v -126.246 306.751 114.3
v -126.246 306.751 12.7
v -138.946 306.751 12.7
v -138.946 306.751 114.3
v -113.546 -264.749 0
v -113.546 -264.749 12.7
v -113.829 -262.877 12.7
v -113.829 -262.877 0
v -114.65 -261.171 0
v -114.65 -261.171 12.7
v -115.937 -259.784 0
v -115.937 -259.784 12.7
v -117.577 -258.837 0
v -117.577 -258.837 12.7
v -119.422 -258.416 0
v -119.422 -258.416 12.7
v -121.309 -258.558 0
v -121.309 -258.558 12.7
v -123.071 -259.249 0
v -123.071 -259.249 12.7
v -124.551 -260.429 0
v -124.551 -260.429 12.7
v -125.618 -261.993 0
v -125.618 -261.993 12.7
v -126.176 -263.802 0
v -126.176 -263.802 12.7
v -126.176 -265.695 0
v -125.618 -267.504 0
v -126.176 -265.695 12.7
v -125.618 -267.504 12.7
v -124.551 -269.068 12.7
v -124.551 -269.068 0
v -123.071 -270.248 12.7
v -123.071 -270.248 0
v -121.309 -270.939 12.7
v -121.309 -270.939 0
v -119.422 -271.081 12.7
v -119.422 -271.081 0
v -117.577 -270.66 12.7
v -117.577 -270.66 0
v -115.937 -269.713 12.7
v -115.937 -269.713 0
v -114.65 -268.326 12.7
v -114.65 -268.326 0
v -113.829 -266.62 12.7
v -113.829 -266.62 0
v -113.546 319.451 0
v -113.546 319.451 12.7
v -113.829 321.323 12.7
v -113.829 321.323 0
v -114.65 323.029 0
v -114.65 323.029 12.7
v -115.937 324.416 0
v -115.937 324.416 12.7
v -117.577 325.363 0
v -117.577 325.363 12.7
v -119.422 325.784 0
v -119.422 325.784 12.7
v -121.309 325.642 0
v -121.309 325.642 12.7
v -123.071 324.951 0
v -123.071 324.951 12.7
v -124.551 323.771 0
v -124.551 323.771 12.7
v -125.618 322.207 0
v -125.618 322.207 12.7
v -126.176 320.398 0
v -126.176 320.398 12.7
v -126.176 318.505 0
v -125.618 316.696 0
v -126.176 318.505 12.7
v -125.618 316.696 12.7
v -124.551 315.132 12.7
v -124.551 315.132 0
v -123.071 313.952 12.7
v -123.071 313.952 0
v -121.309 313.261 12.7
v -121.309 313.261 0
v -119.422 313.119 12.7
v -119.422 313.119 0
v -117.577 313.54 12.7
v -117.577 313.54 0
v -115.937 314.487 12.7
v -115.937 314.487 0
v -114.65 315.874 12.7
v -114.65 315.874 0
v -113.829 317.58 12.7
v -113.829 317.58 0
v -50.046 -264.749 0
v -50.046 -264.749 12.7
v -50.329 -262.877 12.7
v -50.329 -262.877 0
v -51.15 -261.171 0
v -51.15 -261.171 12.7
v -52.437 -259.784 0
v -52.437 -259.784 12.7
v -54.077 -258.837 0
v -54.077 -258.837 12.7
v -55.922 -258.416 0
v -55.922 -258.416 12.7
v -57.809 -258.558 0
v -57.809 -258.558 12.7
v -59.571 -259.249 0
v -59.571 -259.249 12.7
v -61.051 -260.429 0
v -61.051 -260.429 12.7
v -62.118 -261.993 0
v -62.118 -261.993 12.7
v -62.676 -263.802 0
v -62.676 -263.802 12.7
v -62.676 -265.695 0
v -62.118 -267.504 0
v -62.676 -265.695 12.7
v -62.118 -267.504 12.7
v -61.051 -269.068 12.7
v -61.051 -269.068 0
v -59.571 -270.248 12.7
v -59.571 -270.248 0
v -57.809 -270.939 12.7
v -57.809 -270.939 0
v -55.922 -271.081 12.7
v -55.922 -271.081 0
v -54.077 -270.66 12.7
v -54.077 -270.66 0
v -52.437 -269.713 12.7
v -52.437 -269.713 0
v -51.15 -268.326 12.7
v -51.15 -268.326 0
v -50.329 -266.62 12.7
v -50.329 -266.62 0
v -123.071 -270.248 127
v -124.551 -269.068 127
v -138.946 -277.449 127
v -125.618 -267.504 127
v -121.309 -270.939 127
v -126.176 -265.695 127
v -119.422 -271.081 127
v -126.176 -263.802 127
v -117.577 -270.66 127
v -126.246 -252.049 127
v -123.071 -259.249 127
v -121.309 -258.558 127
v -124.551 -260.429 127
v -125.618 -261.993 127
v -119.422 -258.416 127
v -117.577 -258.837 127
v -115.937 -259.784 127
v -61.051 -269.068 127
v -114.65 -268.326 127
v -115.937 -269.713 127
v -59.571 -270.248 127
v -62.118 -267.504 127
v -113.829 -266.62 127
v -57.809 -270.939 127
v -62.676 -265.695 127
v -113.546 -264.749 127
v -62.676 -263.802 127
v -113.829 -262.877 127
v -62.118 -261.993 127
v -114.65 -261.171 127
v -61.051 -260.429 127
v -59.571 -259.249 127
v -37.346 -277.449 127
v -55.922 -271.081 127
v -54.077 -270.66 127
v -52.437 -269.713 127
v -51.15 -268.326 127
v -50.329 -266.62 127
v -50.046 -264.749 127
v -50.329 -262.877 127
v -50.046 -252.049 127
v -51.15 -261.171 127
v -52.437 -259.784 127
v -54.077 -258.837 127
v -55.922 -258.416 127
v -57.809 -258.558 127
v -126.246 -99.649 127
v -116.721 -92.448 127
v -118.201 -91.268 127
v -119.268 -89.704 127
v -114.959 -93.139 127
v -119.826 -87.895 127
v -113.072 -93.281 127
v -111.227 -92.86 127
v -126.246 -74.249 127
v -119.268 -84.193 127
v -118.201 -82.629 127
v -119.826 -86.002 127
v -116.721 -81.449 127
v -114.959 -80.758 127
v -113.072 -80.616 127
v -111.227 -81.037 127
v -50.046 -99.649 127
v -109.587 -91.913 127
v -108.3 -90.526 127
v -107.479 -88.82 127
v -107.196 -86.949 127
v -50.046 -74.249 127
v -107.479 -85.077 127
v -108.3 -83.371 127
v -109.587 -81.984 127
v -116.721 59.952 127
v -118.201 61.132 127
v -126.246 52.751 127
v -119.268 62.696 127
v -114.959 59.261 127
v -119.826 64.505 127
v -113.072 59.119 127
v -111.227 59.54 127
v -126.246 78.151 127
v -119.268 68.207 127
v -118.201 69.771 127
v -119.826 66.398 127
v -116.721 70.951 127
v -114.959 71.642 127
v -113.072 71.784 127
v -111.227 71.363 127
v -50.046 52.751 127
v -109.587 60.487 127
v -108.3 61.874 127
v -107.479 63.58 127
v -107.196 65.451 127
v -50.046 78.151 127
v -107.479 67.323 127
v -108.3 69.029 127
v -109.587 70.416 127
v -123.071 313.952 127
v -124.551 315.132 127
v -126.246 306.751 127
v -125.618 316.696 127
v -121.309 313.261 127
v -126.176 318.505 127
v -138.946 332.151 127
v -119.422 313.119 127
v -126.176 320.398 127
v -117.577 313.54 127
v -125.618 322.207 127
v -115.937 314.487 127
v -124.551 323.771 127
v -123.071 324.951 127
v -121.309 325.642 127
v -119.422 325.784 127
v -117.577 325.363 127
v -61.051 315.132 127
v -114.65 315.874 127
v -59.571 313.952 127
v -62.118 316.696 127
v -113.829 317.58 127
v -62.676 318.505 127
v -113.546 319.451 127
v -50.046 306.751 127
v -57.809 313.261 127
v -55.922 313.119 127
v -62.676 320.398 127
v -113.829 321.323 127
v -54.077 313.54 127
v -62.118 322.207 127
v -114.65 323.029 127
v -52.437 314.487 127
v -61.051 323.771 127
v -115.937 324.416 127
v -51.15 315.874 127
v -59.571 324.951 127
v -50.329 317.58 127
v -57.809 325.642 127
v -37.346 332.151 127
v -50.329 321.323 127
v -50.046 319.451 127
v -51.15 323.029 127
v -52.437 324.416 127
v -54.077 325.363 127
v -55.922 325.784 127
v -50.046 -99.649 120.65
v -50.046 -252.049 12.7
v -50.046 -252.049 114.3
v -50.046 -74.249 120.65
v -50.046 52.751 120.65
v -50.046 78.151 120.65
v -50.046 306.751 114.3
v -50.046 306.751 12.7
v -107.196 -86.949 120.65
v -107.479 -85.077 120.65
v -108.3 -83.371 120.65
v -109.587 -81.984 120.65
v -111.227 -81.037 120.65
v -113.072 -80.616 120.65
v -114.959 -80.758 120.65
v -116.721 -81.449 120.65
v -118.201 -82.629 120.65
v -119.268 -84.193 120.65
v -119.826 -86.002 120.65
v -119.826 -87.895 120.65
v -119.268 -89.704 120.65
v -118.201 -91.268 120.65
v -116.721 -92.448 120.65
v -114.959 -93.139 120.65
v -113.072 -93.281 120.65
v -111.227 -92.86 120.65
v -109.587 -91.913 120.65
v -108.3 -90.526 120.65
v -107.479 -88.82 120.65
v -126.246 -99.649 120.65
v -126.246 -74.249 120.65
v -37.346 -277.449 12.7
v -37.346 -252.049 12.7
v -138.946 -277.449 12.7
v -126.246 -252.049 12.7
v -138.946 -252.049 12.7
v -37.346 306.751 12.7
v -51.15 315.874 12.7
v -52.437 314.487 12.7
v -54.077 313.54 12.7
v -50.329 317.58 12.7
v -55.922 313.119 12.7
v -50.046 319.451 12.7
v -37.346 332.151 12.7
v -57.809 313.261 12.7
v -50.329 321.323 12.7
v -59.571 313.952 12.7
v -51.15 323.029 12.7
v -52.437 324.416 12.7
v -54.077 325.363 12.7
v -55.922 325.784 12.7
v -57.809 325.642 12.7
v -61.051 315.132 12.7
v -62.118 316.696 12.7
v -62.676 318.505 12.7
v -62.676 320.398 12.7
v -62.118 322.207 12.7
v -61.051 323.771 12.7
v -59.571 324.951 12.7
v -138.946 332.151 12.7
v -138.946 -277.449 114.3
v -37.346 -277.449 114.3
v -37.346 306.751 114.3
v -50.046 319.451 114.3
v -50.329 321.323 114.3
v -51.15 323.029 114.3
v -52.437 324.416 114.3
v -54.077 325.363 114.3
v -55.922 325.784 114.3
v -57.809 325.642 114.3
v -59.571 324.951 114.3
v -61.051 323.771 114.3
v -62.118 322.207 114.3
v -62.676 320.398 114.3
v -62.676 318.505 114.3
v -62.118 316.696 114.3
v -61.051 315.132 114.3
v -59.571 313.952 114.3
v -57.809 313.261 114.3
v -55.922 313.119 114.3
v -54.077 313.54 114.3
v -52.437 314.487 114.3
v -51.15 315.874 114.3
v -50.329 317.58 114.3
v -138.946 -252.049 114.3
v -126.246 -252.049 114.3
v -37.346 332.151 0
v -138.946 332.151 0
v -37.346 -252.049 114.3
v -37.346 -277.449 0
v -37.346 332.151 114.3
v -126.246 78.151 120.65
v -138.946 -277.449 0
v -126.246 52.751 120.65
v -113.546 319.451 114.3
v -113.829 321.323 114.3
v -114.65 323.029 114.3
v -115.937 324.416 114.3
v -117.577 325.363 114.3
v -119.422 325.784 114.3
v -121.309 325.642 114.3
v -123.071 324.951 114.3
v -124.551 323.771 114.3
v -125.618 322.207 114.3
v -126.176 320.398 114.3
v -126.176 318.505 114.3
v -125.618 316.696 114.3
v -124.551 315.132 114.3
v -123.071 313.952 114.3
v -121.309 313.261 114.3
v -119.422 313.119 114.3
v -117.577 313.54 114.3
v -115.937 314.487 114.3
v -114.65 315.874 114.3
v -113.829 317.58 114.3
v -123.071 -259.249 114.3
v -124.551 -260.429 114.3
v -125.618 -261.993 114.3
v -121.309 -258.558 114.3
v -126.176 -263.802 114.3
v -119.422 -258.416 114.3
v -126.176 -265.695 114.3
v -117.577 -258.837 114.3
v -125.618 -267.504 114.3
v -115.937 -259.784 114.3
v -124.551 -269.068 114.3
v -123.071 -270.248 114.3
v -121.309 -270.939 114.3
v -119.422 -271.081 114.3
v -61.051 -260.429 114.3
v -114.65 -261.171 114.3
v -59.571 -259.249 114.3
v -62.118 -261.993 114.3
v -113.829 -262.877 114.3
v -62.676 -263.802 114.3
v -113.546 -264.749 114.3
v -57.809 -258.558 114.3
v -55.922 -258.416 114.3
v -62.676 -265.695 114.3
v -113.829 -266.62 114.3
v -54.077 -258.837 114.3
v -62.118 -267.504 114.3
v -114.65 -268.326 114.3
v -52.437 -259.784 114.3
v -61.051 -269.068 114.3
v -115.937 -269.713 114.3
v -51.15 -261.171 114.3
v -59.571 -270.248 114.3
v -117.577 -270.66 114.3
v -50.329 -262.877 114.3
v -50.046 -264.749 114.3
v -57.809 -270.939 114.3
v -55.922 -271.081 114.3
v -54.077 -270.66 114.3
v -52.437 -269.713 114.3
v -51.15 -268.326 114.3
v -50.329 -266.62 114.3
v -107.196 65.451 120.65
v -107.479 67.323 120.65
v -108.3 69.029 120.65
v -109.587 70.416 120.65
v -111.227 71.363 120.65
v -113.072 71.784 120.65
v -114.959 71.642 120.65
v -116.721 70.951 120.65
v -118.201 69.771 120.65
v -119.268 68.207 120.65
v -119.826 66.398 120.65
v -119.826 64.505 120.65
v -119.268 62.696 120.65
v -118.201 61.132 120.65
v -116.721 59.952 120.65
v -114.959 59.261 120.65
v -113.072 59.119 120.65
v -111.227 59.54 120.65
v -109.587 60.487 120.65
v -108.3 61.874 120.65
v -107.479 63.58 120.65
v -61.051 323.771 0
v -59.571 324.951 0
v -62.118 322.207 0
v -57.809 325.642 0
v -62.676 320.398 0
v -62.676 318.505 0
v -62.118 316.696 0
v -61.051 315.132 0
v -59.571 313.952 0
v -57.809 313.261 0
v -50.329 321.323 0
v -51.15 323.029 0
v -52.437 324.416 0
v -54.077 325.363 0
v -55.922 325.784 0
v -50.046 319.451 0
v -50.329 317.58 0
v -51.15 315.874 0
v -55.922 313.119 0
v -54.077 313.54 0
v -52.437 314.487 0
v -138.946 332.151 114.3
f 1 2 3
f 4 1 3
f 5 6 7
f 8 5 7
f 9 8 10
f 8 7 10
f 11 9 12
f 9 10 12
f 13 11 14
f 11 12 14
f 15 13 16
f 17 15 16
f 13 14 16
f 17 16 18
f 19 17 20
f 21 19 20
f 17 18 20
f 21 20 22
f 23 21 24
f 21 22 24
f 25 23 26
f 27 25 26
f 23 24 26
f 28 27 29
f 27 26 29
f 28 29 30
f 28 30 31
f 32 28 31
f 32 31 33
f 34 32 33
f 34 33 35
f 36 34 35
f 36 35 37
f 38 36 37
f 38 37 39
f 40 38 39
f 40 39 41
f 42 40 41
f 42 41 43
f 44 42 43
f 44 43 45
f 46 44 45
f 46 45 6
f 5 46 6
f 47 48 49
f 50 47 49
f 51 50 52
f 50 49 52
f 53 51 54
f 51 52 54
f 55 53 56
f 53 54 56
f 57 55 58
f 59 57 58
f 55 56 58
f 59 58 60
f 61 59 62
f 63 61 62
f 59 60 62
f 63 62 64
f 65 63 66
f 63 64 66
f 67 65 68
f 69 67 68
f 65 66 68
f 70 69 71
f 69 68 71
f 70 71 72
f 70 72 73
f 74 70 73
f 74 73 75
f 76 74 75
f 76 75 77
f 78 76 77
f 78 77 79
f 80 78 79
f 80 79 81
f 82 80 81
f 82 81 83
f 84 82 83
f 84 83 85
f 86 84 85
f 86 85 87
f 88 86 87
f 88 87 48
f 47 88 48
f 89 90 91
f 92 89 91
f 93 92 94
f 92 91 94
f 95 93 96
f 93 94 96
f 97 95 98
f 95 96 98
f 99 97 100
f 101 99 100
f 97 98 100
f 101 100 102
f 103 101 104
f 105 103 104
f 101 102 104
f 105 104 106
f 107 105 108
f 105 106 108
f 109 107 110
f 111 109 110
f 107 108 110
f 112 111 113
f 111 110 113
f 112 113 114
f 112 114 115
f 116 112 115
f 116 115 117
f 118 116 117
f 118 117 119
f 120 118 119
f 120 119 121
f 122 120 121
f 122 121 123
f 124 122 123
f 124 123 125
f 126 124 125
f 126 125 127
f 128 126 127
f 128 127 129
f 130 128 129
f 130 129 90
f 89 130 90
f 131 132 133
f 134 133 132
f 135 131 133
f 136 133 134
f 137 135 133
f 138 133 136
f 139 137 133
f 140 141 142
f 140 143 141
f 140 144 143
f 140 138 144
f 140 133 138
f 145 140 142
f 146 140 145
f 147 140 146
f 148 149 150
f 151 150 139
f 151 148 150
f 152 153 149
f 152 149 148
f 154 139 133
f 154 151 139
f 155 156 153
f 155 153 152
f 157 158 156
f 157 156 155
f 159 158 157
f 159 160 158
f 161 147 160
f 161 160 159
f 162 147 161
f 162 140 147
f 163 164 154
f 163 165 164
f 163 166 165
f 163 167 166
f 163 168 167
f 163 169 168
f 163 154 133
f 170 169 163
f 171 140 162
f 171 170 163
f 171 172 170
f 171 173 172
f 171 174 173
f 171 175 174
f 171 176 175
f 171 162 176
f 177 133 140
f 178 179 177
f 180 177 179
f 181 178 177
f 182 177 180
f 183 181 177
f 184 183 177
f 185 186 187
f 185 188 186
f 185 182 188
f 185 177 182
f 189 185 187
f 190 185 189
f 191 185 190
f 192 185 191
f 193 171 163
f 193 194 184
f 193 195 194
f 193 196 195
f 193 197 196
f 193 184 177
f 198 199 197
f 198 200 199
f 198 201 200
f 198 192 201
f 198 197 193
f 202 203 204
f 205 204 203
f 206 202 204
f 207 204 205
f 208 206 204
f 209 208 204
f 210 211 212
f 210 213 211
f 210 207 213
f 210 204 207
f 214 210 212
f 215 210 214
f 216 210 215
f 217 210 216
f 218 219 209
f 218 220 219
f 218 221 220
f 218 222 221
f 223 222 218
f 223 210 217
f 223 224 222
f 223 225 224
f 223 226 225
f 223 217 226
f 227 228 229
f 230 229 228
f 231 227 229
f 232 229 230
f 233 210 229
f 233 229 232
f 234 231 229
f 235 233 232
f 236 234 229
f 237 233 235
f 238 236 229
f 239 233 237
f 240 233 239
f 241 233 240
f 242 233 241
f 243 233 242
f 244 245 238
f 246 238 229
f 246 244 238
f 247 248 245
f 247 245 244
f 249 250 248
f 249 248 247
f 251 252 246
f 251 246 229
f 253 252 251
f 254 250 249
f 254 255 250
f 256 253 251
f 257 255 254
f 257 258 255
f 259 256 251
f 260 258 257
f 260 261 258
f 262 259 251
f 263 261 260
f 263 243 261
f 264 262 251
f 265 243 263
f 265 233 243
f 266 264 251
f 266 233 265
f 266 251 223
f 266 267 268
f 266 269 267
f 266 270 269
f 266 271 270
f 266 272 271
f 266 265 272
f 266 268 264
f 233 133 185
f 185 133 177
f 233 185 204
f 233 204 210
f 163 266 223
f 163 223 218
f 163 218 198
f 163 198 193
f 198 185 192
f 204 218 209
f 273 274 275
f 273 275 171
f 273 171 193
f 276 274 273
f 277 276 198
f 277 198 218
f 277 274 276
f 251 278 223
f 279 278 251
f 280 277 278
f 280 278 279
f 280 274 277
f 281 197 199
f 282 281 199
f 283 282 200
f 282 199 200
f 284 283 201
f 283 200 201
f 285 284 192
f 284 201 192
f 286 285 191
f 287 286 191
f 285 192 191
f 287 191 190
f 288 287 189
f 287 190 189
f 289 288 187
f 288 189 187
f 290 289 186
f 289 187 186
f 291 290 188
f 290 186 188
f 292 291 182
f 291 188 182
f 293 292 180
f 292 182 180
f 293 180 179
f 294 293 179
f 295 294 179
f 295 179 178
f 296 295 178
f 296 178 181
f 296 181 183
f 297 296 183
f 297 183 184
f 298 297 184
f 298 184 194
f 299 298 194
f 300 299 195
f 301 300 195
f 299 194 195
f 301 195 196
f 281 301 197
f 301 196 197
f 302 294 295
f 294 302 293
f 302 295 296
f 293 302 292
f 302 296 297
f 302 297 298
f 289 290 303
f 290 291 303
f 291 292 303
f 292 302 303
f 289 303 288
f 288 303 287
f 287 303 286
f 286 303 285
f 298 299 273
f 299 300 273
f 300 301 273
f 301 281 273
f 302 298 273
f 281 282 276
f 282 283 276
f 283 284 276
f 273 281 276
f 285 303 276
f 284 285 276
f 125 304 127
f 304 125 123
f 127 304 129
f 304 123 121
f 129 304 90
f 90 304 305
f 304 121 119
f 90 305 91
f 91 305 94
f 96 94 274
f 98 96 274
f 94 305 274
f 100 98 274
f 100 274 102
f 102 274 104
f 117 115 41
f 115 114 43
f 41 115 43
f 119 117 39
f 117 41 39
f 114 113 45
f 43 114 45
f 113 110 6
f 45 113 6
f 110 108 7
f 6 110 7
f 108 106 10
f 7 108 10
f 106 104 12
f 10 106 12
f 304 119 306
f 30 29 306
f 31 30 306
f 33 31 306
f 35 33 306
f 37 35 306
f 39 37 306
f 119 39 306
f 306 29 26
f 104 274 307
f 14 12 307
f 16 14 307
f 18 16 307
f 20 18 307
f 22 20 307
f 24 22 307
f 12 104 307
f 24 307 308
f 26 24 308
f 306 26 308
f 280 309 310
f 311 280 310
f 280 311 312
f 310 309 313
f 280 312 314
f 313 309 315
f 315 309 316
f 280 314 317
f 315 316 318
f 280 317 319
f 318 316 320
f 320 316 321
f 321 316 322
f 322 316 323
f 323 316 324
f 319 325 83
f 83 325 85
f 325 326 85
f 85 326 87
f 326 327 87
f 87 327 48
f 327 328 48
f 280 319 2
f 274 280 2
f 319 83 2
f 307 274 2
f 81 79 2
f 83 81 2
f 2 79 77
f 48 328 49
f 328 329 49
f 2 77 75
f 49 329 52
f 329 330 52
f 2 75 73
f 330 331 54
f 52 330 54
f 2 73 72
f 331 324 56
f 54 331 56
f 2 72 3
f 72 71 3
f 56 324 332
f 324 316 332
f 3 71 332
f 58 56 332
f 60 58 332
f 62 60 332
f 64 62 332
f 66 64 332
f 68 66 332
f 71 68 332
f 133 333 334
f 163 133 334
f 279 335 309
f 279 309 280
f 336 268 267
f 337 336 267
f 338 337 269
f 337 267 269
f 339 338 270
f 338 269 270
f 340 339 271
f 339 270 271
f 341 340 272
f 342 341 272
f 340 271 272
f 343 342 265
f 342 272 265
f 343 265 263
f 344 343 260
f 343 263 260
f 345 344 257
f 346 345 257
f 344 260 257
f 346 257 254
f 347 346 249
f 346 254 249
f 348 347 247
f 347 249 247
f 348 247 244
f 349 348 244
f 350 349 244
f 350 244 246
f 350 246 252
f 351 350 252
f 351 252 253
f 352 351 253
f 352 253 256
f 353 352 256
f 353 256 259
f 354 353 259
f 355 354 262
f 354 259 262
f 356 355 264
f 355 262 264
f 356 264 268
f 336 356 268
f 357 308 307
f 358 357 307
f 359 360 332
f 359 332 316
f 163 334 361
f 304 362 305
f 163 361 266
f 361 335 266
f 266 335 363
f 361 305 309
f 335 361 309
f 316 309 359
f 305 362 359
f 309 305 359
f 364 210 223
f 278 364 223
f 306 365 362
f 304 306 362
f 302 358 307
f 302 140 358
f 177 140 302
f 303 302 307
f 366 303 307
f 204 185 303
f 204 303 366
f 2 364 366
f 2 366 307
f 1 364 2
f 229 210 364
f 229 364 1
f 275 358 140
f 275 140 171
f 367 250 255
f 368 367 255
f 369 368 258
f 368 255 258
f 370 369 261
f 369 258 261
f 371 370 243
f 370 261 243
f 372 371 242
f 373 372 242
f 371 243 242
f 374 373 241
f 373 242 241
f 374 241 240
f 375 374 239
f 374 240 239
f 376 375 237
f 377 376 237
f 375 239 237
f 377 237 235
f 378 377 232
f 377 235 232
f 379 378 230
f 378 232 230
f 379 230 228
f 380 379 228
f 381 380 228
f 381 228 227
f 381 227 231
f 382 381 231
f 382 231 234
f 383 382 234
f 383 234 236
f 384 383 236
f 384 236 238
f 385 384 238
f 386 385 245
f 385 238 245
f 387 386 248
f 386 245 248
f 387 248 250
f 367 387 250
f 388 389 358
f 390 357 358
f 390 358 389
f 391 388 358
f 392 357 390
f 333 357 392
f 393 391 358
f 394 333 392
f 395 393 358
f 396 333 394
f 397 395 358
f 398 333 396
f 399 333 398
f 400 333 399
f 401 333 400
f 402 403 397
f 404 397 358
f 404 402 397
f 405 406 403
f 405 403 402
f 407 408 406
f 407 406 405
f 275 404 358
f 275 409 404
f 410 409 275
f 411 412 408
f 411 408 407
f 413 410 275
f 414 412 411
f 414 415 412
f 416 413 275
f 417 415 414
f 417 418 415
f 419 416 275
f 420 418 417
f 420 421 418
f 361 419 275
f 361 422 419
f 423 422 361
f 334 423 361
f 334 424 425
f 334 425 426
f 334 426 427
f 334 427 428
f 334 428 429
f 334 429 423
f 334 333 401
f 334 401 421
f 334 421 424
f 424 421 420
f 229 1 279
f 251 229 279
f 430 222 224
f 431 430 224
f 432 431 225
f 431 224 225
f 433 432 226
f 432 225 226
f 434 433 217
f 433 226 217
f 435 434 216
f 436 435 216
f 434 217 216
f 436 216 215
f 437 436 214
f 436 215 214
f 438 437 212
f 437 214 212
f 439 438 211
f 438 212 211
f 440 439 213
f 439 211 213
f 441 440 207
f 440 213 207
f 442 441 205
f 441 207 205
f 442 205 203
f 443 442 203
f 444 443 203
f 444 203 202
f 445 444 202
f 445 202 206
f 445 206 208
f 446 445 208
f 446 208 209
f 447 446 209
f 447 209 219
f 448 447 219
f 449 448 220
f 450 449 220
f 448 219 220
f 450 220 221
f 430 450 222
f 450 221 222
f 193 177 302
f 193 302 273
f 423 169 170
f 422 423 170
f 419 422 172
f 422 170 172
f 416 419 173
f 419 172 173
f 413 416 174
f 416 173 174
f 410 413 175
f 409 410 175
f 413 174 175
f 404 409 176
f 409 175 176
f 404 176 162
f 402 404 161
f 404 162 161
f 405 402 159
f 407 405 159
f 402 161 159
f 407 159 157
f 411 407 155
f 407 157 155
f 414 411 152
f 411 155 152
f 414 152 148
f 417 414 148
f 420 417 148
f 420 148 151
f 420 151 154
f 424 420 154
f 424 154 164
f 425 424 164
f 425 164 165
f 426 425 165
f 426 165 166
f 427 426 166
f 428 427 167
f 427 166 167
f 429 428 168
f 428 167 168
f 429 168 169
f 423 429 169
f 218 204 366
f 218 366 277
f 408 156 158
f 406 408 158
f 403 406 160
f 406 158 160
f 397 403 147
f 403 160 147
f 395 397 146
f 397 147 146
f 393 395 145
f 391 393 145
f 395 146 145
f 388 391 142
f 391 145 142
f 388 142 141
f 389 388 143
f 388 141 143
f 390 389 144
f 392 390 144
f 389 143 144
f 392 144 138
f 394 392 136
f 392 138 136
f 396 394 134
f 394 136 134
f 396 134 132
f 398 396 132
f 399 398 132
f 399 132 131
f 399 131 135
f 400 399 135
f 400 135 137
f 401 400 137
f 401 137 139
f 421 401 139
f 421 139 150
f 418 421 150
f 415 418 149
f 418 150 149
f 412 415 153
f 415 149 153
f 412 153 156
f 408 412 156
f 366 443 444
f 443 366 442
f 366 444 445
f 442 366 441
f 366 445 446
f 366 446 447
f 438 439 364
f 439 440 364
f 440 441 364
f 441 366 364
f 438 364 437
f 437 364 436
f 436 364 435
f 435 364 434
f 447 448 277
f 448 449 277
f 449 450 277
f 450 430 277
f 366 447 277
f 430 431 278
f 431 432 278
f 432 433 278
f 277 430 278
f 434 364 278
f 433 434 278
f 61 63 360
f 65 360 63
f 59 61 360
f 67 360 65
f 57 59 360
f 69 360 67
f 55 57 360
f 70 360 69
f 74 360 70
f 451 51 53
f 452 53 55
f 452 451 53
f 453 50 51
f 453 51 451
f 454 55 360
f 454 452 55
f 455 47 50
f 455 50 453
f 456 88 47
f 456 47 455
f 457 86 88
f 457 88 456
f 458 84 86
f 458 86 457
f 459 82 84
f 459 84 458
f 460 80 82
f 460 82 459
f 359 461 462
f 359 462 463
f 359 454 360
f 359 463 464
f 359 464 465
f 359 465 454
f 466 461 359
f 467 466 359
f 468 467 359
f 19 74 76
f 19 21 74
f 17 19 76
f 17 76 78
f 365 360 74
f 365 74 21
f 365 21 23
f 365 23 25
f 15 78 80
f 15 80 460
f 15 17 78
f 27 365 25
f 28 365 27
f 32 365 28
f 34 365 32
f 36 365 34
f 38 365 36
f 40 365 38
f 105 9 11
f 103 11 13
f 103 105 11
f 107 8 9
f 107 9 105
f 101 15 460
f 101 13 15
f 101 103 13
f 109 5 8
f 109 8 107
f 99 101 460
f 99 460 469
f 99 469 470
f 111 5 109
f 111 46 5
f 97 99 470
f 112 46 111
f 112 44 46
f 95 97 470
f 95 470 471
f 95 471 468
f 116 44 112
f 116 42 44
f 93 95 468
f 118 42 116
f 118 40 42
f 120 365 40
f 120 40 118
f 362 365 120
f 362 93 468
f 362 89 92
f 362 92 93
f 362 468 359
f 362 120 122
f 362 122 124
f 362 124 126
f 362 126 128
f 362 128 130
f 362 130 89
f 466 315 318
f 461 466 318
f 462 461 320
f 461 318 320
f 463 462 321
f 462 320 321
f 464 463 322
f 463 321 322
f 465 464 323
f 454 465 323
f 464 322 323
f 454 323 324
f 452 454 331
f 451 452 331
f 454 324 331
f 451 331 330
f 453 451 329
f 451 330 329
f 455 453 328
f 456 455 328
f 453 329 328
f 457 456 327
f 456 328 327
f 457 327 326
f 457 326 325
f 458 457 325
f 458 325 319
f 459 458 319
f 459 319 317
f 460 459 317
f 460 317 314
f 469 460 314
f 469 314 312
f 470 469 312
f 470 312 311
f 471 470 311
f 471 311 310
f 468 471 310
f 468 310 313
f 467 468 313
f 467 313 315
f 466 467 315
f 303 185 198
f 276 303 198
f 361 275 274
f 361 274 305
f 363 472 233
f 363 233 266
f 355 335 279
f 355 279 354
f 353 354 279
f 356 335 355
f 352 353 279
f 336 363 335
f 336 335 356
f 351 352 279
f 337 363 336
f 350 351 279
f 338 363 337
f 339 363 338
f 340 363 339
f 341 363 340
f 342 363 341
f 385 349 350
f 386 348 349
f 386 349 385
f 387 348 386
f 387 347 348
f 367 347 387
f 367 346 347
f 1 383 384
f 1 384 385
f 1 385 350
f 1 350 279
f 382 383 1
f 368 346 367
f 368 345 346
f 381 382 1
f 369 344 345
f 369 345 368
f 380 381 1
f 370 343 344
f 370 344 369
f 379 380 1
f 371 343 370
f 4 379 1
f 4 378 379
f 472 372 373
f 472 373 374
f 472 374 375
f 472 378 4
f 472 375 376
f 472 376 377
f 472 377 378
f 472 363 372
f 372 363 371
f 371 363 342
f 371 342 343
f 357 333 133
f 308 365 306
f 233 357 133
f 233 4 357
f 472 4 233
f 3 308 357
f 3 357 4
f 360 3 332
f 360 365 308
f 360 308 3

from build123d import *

# Parameters (mm, degrees)
F0_W      = 101.6
F0_H      = 609.6
F0_W_2    = 76.2
F0_H_2    = 558.8
F1_DEPTH  = 127
F2_W      = 76.2
F2_H      = 558.8
F3_DEPTH  = 19.05
F4_W      = 76.2
F4_H      = 25.4
F5_DEPTH  = 6.35
F6_W      = 101.6
F6_H      = 101.6
F7_DEPTH  = 25.4
F8_W      = 101.6
F8_H      = 101.6
F9_DEPTH  = 25.4
F3_FACE_W = 76.2
F3_FACE_H = 558.8
F10_DEPTH = 6.35
F11_R     = 6.35
F12_DEPTH = 6.35
F13_R     = 6.35
F14_DEPTH = 12.7
F15_DEPTH = 127


with BuildPart() as f1:
    # F0 (on Top) → F1 (new body)
    with BuildSketch(Plane.XY):
        with Locations((-88.146448, 27.351462)):
            Rectangle(F0_W, F0_H)
        with Locations((-88.146448, 27.351462)):
            Rectangle(F0_W_2, F0_H_2, mode=Mode.SUBTRACT)
    extrude(amount=F1_DEPTH)

    # F2 (on face) → F3 (join)
    with BuildSketch(Plane(origin=(0, 0, 0), x_dir=(1, 0, 0), z_dir=(0, 0, -1))):
        with Locations((-88.146448, -27.351462)):
            Rectangle(F2_W, F2_H)
    extrude(amount=-F3_DEPTH)

    # F4 (on face) → F5 (join)
    with BuildSketch(Plane.XY.offset(127)):
        with Locations((-88.146448, 65.451462)):
            Rectangle(F4_W, F4_H)
        with Locations((-88.146448, -86.948538)):
            Rectangle(F4_W, F4_H)
    extrude(amount=-F5_DEPTH)

    # F6 (on face) → F7 (cut)
    with BuildSketch(Plane.XZ.offset(277.448538)):
        with Locations((-88.146448, 63.5)):
            Rectangle(F6_W, F6_H)
    extrude(amount=-F7_DEPTH, mode=Mode.SUBTRACT)

    # F8 (on face) → F9 (cut)
    with BuildSketch(Plane(origin=(0, 332.151462, 0), x_dir=(-1, 0, 0), z_dir=(0, 1, 0))):
        with Locations((88.146448, 63.5)):
            Rectangle(F8_W, F8_H)
    extrude(amount=-F9_DEPTH, mode=Mode.SUBTRACT)

    # F3_face (on face) → F10 (cut)
    with BuildSketch(Plane(origin=(-88.146448, 27.351462, 19.05), x_dir=(1, 0, 0), z_dir=(0, 0, 1))):
        Rectangle(F3_FACE_W, F3_FACE_H)
    extrude(amount=-F10_DEPTH, mode=Mode.SUBTRACT)

    # F11 (on face) → F12 (cut)
    with BuildSketch(Plane.XY.offset(127)):
        with Locations((-113.546448, 65.451462)):
            Circle(F11_R)
        with Locations((-113.546448, -86.948538)):
            Circle(F11_R)
    extrude(amount=-F12_DEPTH, mode=Mode.SUBTRACT)

    # F13 (on face) → F14 (cut)
    with BuildSketch(Plane.XY.offset(127)):
        with Locations((-119.896448, -264.748538)):
            Circle(F13_R)
        with Locations((-56.396448, -264.748538)):
            Circle(F13_R)
        with Locations((-119.896448, 319.451462)):
            Circle(F13_R)
        with Locations((-56.396448, 319.451462)):
            Circle(F13_R)
    extrude(amount=-F14_DEPTH, mode=Mode.SUBTRACT)

    # F13 (on face) → F15 (cut)
    with BuildSketch(Plane.XY.offset(127)):
        with Locations((-119.896448, 319.451462)):
            Circle(F13_R)
        with Locations((-56.396448, 319.451462)):
            Circle(F13_R)
        with Locations((-119.896448, -264.748538)):
            Circle(F13_R)
        with Locations((-56.396448, -264.748538)):
            Circle(F13_R)
    extrude(amount=-F15_DEPTH, mode=Mode.SUBTRACT)


solid = f1.part
